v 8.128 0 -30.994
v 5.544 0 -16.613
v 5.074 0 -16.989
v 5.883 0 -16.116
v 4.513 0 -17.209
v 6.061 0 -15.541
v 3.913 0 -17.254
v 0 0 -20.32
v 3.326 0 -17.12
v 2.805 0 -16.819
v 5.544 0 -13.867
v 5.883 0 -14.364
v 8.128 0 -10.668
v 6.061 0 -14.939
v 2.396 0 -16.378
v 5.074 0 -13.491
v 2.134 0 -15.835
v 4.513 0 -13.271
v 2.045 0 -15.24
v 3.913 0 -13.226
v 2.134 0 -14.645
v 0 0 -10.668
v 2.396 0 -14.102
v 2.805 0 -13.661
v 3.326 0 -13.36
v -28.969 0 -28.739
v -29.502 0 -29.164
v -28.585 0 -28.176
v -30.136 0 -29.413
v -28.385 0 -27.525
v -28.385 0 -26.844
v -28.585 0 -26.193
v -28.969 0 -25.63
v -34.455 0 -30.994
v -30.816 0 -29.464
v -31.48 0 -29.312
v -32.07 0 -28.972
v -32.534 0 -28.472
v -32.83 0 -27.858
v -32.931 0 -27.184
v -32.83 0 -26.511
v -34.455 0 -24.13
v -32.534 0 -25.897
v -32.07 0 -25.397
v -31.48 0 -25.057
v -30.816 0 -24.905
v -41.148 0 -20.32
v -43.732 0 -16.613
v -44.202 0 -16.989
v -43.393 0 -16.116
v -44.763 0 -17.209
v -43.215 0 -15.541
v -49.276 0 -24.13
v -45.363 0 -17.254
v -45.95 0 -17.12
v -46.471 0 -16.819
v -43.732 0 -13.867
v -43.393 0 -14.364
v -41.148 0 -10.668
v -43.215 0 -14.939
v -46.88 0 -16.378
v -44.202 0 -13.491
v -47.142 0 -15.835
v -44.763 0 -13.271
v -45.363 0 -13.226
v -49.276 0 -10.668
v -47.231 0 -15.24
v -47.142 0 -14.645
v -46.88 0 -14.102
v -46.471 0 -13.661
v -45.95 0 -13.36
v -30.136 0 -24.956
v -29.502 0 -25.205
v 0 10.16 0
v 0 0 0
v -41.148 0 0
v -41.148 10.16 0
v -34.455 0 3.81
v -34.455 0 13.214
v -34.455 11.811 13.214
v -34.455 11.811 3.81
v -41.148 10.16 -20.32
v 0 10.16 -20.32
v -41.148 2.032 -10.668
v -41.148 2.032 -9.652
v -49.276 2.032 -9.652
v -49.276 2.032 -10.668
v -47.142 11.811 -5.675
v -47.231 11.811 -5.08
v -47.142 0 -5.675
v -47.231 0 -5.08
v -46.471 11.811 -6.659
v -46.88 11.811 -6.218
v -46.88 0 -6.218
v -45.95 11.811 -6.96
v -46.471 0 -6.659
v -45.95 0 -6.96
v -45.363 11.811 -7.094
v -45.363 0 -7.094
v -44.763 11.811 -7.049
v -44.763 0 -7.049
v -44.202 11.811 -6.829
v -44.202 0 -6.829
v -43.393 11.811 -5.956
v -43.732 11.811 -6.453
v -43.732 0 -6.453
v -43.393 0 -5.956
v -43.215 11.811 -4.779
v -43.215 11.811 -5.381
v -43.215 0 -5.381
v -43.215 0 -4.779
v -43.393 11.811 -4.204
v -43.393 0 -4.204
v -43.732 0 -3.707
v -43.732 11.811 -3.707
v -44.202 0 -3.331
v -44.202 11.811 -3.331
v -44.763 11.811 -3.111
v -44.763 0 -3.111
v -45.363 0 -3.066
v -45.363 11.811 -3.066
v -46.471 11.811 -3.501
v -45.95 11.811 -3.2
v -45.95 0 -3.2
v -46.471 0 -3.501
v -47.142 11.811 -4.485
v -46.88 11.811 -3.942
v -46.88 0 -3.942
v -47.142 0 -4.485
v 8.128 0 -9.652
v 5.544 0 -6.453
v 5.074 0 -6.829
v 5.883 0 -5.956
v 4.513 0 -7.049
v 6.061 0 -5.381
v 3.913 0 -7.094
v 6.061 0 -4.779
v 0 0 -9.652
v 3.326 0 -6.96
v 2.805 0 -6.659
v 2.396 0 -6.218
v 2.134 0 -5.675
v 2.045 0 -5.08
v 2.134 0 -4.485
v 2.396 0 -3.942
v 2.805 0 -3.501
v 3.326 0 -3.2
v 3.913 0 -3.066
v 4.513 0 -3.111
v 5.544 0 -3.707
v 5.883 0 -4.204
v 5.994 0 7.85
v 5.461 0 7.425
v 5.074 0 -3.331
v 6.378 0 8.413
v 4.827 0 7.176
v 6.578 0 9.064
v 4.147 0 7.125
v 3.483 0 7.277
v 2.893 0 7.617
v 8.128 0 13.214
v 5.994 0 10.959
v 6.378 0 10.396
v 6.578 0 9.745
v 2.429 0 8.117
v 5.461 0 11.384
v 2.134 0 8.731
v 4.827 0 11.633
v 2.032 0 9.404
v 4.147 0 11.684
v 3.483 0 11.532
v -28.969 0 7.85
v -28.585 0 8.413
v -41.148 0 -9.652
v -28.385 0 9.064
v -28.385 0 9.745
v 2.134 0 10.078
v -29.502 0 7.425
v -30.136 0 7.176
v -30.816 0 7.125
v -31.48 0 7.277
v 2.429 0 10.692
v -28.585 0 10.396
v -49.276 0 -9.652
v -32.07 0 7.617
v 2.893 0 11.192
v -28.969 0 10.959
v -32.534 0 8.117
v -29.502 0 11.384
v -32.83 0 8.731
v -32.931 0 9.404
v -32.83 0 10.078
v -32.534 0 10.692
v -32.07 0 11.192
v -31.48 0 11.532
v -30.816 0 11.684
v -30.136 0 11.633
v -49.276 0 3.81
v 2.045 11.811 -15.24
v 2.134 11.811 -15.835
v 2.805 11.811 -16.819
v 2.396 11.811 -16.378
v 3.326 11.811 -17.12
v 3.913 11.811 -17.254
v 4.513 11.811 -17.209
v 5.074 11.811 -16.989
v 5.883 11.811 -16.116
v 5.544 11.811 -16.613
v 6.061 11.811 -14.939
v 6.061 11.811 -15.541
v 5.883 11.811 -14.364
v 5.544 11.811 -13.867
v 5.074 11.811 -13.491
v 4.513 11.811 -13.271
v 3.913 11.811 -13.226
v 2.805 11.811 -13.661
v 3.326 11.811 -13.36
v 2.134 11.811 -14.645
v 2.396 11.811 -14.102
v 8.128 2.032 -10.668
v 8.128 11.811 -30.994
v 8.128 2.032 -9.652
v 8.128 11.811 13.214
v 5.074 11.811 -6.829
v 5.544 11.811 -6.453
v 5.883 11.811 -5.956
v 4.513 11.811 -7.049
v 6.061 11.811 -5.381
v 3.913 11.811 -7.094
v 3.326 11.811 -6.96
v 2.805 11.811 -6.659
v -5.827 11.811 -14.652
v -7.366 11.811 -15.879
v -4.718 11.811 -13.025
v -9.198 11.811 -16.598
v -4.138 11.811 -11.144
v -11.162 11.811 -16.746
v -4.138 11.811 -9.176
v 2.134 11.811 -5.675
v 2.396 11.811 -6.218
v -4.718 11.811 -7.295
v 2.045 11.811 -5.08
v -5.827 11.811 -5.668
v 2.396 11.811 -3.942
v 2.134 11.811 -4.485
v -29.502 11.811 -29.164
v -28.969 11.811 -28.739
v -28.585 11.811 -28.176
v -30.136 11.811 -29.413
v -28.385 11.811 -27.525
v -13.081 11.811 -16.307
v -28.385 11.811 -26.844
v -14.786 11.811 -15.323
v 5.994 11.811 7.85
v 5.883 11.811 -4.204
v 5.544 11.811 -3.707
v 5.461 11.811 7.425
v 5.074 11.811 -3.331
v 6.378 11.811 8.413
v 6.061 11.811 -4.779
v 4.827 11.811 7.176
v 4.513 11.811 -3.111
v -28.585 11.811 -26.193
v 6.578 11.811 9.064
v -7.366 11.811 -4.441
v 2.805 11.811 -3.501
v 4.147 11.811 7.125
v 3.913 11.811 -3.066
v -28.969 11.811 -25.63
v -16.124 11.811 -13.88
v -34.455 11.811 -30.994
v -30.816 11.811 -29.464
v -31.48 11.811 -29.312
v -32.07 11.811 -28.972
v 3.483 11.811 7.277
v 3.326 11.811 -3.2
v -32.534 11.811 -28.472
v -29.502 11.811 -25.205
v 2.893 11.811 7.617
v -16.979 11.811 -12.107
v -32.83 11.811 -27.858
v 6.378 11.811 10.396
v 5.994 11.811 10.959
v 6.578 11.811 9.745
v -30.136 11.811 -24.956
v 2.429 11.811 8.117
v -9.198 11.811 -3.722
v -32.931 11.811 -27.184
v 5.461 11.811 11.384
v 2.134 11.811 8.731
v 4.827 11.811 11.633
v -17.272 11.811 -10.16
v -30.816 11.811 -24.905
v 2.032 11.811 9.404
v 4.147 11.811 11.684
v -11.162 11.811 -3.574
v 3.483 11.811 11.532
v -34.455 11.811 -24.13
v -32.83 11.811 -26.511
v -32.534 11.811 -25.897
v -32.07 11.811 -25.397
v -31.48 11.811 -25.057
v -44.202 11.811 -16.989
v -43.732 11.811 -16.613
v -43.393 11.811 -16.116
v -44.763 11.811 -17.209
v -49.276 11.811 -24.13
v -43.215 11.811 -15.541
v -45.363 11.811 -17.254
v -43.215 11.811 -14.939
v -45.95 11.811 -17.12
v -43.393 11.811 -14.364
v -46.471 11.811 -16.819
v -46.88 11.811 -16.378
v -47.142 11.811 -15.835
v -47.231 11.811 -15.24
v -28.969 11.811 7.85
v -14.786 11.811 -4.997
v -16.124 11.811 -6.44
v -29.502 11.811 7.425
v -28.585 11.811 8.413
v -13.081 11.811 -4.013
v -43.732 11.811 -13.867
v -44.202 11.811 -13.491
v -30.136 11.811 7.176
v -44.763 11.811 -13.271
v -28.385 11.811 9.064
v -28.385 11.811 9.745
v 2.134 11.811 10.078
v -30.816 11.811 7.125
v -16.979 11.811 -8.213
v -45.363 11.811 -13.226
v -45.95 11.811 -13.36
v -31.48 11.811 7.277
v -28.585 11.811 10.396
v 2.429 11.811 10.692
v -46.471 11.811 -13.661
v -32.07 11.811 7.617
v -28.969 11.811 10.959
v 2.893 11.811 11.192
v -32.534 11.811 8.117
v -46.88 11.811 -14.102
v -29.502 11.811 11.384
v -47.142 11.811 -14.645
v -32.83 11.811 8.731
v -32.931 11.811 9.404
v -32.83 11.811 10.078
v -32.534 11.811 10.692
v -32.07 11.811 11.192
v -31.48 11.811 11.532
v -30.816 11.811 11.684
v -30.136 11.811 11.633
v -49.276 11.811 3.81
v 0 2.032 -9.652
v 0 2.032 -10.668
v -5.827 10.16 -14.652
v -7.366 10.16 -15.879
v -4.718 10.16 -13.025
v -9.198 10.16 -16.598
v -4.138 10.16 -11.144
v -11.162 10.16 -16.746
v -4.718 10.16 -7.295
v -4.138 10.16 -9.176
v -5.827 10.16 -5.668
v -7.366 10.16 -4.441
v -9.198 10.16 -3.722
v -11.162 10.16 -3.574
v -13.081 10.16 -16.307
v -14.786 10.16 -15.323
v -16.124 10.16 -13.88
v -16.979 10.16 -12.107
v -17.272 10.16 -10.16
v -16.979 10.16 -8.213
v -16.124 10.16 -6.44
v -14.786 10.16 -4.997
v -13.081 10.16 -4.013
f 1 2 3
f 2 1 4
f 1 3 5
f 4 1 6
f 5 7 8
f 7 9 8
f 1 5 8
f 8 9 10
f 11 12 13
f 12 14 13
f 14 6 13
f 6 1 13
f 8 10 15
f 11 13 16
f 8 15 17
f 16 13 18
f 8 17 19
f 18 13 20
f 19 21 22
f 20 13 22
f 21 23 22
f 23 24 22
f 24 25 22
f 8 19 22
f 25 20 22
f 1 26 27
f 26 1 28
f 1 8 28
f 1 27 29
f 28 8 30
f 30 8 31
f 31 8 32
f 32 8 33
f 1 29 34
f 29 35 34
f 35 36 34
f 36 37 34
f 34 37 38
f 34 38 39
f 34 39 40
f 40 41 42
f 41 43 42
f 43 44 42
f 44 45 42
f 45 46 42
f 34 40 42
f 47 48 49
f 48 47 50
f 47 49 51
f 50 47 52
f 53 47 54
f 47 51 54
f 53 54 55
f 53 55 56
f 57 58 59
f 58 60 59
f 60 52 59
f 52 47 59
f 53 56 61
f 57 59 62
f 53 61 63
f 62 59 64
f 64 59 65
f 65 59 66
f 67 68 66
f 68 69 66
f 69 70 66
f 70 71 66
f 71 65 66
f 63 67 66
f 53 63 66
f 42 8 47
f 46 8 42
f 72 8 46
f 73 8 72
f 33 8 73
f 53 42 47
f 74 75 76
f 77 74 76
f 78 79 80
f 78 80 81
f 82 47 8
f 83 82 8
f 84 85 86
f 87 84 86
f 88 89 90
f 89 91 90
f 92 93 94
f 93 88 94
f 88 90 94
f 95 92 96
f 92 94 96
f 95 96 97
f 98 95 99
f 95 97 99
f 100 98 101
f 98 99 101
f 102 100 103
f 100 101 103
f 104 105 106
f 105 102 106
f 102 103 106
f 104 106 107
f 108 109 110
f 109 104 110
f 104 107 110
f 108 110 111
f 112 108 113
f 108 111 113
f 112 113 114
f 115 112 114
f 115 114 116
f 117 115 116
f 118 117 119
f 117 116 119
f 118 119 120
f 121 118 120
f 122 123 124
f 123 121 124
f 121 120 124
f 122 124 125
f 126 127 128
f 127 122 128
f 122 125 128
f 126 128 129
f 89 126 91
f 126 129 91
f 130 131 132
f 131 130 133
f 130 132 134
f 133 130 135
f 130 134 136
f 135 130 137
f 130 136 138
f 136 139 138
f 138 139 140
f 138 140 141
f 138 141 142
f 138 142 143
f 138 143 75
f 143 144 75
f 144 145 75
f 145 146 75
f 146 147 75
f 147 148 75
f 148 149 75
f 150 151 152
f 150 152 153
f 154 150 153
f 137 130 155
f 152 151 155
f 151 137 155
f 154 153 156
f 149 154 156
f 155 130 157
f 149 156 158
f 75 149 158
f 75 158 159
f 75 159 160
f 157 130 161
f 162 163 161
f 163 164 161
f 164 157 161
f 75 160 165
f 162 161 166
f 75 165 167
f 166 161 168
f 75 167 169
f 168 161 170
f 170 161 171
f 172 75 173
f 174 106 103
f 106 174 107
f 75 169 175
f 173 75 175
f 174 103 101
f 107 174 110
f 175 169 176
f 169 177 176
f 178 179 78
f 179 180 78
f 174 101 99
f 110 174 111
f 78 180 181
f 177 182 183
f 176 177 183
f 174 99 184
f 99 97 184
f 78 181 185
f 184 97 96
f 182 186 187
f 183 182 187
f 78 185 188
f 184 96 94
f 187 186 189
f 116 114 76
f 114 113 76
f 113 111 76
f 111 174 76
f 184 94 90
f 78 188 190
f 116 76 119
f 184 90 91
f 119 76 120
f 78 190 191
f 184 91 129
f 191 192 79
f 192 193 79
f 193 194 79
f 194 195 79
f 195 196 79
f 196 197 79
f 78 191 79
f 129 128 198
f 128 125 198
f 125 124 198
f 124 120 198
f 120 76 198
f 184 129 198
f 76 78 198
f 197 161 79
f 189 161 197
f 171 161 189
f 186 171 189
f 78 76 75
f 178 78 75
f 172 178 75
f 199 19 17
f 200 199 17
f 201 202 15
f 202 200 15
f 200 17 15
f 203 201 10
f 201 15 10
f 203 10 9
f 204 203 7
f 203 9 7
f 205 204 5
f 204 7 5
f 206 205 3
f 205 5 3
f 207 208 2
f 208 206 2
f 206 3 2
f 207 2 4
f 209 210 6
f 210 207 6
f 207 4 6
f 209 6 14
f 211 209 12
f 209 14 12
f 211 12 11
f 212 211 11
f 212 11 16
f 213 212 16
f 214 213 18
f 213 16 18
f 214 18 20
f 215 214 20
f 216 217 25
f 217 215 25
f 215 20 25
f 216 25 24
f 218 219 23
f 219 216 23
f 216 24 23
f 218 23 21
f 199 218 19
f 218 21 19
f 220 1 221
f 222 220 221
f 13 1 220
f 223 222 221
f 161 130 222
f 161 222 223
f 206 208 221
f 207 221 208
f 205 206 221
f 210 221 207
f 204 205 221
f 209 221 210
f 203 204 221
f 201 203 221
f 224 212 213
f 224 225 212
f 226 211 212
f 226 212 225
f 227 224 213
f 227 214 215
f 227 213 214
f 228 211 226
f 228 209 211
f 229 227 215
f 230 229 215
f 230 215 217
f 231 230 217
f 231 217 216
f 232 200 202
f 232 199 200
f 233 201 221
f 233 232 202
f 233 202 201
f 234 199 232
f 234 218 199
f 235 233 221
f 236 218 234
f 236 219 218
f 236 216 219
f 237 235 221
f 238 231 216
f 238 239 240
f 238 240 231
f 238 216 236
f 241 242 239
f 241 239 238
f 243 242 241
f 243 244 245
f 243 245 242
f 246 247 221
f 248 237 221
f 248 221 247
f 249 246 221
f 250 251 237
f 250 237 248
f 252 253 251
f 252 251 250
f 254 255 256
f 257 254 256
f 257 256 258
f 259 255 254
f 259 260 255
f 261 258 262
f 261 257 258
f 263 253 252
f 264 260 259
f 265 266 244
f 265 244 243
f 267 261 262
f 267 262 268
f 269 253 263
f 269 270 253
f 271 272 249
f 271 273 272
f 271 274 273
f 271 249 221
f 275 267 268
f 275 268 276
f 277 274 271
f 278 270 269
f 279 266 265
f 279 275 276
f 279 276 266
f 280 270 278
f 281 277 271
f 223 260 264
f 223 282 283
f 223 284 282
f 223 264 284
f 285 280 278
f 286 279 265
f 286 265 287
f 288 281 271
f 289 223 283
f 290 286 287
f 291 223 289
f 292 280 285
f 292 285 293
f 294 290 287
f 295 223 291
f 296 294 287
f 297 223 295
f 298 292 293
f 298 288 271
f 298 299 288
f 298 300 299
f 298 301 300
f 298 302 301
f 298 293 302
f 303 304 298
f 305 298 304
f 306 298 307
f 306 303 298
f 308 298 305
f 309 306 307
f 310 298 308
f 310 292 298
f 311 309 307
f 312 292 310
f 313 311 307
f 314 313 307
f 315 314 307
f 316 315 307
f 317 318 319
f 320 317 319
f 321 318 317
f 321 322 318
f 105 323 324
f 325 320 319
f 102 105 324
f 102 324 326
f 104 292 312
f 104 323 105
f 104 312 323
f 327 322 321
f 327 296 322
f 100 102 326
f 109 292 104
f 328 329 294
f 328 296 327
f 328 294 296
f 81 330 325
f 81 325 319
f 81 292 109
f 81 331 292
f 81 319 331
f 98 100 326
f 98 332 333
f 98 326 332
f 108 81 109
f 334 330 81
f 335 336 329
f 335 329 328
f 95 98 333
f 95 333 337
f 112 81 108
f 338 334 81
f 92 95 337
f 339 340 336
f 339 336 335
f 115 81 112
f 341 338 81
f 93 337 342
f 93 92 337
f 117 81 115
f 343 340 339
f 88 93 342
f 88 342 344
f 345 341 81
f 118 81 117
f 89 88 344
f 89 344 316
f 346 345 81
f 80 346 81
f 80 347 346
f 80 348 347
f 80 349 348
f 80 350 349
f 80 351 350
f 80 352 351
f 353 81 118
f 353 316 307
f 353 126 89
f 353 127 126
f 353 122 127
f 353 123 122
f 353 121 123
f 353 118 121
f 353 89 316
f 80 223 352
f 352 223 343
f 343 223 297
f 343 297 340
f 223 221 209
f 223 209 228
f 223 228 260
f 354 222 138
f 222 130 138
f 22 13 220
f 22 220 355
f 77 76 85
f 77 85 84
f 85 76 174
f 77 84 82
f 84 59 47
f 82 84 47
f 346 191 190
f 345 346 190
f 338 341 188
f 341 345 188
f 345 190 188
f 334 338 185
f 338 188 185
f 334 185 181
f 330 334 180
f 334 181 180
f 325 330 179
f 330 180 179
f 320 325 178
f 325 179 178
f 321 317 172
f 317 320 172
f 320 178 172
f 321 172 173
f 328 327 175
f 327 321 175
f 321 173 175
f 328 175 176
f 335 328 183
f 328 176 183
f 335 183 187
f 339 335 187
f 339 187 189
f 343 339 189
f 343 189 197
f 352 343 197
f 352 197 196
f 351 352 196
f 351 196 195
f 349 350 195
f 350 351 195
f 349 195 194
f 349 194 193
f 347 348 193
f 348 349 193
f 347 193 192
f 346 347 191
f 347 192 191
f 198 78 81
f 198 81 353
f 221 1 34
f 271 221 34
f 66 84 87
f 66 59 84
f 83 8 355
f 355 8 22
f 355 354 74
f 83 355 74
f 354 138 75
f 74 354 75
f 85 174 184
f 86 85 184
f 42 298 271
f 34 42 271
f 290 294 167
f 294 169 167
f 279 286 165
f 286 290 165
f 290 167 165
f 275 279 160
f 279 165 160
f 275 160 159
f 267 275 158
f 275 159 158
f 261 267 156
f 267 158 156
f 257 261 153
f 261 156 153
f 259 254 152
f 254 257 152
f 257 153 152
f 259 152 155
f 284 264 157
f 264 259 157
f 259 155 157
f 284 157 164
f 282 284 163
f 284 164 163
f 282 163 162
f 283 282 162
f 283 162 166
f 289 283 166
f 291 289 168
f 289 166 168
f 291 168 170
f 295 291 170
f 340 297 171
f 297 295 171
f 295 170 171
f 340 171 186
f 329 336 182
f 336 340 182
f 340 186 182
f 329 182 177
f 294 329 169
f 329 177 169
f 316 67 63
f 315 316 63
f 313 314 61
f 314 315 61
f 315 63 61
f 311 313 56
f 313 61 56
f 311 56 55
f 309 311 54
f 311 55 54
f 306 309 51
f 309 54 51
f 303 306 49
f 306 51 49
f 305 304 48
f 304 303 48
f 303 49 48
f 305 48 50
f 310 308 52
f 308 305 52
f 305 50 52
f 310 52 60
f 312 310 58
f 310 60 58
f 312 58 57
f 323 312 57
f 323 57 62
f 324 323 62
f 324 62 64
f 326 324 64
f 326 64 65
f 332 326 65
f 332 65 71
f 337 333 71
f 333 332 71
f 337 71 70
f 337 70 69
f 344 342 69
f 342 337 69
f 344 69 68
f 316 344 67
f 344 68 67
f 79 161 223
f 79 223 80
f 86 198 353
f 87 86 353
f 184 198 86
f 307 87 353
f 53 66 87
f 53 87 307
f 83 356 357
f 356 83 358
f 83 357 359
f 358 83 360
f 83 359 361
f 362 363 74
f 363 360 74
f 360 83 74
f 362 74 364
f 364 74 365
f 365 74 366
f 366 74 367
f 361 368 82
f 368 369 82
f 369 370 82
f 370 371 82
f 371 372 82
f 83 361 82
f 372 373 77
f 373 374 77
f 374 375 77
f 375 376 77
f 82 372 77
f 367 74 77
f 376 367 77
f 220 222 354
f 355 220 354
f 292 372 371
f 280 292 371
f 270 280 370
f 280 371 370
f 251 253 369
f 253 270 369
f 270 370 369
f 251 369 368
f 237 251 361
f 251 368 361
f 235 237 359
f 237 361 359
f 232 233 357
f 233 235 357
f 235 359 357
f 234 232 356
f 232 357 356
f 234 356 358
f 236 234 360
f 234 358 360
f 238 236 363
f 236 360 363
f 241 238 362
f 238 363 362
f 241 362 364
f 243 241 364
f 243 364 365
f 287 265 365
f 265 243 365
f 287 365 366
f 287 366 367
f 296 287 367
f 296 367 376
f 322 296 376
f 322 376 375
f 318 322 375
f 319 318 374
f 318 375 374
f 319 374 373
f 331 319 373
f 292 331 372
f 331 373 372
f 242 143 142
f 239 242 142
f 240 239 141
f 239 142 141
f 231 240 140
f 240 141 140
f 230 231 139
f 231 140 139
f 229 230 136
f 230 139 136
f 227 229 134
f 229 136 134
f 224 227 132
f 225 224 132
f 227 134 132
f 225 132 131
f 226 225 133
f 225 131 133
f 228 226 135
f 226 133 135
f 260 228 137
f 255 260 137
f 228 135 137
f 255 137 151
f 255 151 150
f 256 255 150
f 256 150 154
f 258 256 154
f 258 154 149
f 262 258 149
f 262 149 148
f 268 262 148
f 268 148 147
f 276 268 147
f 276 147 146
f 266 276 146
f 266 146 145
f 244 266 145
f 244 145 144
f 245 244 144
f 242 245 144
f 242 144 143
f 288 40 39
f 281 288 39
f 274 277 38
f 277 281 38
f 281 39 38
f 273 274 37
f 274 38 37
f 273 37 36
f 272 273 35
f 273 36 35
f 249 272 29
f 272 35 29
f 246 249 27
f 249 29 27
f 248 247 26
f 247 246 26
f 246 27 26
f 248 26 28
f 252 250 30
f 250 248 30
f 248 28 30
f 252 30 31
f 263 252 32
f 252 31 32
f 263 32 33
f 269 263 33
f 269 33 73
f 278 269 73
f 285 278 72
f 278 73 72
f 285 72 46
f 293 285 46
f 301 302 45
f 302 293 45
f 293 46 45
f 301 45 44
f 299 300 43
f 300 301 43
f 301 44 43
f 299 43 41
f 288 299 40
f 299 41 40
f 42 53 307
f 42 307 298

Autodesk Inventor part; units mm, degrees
ref_plane "YZ Plane" through (0, 0, 0) normal (1, 0, 0) x (0, 1, 0)
ref_plane "XZ Plane" through (0, 0, 0) normal (0, 1, 0) x (-1, 0, 0)
ref_plane "XY Plane" through (0, 0, 0) normal (0, 0, 1) x (1, 0, 0)
sketch "Sketch1" plane through (0, 0, 0) normal (0, 1, 0) x (-1, 0, 0)
  line L0 (0, 0) -> (41.148, 0)
  line L1 (41.148, 0) -> (41.148, -20.32)
  line L2 (41.148, -20.32) -> (0, -20.32)
  line L3 (0, -20.32) -> (0, 0)
  circle A0 centre (45.212, -15.24) radius 2.0193
  circle A1 centre (-4.064, -15.24) radius 2.0193
  circle A2 centre (45.212, -5.08) radius 2.0193
  circle A3 centre (-4.064, -5.08) radius 2.0193
  line L4 (41.148, -9.652) -> (49.276, -9.652)
  line L5 (41.148, -10.668) -> (49.276, -10.668)
  line L6 (-8.128, -9.652) -> (0, -9.652)
  line L7 (-8.128, -10.668) -> (0, -10.668)
  line L8 (-8.128, 3.81) -> (49.276, 3.81)
  line L9 (49.276, 3.81) -> (49.276, -24.13)
  line L10 (49.276, -24.13) -> (-8.128, -24.13)
  line L11 (-8.128, -24.13) -> (-8.128, 3.81)
  line L12 (-6.155, -5.4575) -> (-6.0508, -5.4409)
  line L13 (-6.155, -5.4575) -> (-6.0508, -5.4409)
  line L14 (20.574, -20.32) -> (20.574, 0)
  circle A4 centre (10.668, -10.16) radius 6.604
  circle A5 centre (-4.318, 9.4045) radius 2.0193
  line L15 (-8.128, 13.2145) -> (34.4551, 13.2145)
  circle A6 centre (30.6451, 9.4045) radius 2.0193
  circle A7 centre (30.6451, -27.1845) radius 2.0193
  line L16 (10.668, -30.9945) -> (34.4551, -30.9945)
  line L17 (-8.128, -30.9945) -> (34.4551, -30.9945)
  circle A8 centre (-5.588, -28.4545) radius 2.0193
  line L18 (34.4551, -30.9945) -> (-8.128, -30.9945)
  line L19 (-8.128, -30.9945) -> (-8.128, 13.2145)
  line L20 (-8.128, 13.2145) -> (34.4551, 13.2145)
  line L21 (34.4551, -24.13) -> (34.4551, -30.9945)
  line L22 (34.4551, 13.2145) -> (34.4551, 3.81)
  circle A9 centre (30.6451, 9.4045) radius 2.286
  circle A10 centre (-4.318, 9.4045) radius 2.286
  circle A11 centre (-5.588, -28.4545) radius 2.286
  circle A12 centre (30.6451, -27.1845) radius 2.286
  point P0 (20.574, -10.16)
  point P1 (-8.128, -24.13)
  point P2 (-8.128, 3.81)
  dimension "d0" = 41.148
  dimension "d1" = 20.32
  dimension "d4" = 4.0386
  dimension "d5" = 4.0386
  dimension "d18" = 4.064
  dimension "d19" = 4.064
  dimension "d52" = 8.128
  dimension "d53" = 8.128
  dimension "d54" = 3.81
  dimension "d55" = 3.81
  dimension "d59" = 9.906
  dimension "d60" = 13.208
  dimension "d79" = 4.0386
  dimension "d80" = 4.0386
  dimension "d81" = 4.0386
  dimension "d82" = 4.0386
  dimension "d84" = 3.81
  dimension "d91" = 4.572
  dimension "d92" = 4.572
  dimension "d93" = 4.572
  dimension "d94" = 4.572
extrude "Extrusion10" add sketch "Sketch1" along normal blind 11.811 contours L3 L6 L11 L8 L9 L4 L1 L0 | L0 L14 L2 L3 | L0 L1 L2 L14 | L3 L7 L11 L6 | L2 L1 L5 L9 L10 L11 L7 L3 | L4 L9 L5 L1
extrude "Extrusion11" cut sketch "Sketch1" along normal blind 10.16 contours L0 L14 L2 L3 | L0 L1 L2 L14
extrude "Extrusion12" cut sketch "Sketch1" along normal blind 2.032 contours L3 L7 L11 L6 | L4 L9 L5 L1
extrude "Extrusion13" add sketch "Sketch1" along normal up to surface (11.811 mm away) contours L19 L15 L22 L8 | L10 L21 L16 L17 L19 | A8 | A11
properties part number "Servo Mount"
